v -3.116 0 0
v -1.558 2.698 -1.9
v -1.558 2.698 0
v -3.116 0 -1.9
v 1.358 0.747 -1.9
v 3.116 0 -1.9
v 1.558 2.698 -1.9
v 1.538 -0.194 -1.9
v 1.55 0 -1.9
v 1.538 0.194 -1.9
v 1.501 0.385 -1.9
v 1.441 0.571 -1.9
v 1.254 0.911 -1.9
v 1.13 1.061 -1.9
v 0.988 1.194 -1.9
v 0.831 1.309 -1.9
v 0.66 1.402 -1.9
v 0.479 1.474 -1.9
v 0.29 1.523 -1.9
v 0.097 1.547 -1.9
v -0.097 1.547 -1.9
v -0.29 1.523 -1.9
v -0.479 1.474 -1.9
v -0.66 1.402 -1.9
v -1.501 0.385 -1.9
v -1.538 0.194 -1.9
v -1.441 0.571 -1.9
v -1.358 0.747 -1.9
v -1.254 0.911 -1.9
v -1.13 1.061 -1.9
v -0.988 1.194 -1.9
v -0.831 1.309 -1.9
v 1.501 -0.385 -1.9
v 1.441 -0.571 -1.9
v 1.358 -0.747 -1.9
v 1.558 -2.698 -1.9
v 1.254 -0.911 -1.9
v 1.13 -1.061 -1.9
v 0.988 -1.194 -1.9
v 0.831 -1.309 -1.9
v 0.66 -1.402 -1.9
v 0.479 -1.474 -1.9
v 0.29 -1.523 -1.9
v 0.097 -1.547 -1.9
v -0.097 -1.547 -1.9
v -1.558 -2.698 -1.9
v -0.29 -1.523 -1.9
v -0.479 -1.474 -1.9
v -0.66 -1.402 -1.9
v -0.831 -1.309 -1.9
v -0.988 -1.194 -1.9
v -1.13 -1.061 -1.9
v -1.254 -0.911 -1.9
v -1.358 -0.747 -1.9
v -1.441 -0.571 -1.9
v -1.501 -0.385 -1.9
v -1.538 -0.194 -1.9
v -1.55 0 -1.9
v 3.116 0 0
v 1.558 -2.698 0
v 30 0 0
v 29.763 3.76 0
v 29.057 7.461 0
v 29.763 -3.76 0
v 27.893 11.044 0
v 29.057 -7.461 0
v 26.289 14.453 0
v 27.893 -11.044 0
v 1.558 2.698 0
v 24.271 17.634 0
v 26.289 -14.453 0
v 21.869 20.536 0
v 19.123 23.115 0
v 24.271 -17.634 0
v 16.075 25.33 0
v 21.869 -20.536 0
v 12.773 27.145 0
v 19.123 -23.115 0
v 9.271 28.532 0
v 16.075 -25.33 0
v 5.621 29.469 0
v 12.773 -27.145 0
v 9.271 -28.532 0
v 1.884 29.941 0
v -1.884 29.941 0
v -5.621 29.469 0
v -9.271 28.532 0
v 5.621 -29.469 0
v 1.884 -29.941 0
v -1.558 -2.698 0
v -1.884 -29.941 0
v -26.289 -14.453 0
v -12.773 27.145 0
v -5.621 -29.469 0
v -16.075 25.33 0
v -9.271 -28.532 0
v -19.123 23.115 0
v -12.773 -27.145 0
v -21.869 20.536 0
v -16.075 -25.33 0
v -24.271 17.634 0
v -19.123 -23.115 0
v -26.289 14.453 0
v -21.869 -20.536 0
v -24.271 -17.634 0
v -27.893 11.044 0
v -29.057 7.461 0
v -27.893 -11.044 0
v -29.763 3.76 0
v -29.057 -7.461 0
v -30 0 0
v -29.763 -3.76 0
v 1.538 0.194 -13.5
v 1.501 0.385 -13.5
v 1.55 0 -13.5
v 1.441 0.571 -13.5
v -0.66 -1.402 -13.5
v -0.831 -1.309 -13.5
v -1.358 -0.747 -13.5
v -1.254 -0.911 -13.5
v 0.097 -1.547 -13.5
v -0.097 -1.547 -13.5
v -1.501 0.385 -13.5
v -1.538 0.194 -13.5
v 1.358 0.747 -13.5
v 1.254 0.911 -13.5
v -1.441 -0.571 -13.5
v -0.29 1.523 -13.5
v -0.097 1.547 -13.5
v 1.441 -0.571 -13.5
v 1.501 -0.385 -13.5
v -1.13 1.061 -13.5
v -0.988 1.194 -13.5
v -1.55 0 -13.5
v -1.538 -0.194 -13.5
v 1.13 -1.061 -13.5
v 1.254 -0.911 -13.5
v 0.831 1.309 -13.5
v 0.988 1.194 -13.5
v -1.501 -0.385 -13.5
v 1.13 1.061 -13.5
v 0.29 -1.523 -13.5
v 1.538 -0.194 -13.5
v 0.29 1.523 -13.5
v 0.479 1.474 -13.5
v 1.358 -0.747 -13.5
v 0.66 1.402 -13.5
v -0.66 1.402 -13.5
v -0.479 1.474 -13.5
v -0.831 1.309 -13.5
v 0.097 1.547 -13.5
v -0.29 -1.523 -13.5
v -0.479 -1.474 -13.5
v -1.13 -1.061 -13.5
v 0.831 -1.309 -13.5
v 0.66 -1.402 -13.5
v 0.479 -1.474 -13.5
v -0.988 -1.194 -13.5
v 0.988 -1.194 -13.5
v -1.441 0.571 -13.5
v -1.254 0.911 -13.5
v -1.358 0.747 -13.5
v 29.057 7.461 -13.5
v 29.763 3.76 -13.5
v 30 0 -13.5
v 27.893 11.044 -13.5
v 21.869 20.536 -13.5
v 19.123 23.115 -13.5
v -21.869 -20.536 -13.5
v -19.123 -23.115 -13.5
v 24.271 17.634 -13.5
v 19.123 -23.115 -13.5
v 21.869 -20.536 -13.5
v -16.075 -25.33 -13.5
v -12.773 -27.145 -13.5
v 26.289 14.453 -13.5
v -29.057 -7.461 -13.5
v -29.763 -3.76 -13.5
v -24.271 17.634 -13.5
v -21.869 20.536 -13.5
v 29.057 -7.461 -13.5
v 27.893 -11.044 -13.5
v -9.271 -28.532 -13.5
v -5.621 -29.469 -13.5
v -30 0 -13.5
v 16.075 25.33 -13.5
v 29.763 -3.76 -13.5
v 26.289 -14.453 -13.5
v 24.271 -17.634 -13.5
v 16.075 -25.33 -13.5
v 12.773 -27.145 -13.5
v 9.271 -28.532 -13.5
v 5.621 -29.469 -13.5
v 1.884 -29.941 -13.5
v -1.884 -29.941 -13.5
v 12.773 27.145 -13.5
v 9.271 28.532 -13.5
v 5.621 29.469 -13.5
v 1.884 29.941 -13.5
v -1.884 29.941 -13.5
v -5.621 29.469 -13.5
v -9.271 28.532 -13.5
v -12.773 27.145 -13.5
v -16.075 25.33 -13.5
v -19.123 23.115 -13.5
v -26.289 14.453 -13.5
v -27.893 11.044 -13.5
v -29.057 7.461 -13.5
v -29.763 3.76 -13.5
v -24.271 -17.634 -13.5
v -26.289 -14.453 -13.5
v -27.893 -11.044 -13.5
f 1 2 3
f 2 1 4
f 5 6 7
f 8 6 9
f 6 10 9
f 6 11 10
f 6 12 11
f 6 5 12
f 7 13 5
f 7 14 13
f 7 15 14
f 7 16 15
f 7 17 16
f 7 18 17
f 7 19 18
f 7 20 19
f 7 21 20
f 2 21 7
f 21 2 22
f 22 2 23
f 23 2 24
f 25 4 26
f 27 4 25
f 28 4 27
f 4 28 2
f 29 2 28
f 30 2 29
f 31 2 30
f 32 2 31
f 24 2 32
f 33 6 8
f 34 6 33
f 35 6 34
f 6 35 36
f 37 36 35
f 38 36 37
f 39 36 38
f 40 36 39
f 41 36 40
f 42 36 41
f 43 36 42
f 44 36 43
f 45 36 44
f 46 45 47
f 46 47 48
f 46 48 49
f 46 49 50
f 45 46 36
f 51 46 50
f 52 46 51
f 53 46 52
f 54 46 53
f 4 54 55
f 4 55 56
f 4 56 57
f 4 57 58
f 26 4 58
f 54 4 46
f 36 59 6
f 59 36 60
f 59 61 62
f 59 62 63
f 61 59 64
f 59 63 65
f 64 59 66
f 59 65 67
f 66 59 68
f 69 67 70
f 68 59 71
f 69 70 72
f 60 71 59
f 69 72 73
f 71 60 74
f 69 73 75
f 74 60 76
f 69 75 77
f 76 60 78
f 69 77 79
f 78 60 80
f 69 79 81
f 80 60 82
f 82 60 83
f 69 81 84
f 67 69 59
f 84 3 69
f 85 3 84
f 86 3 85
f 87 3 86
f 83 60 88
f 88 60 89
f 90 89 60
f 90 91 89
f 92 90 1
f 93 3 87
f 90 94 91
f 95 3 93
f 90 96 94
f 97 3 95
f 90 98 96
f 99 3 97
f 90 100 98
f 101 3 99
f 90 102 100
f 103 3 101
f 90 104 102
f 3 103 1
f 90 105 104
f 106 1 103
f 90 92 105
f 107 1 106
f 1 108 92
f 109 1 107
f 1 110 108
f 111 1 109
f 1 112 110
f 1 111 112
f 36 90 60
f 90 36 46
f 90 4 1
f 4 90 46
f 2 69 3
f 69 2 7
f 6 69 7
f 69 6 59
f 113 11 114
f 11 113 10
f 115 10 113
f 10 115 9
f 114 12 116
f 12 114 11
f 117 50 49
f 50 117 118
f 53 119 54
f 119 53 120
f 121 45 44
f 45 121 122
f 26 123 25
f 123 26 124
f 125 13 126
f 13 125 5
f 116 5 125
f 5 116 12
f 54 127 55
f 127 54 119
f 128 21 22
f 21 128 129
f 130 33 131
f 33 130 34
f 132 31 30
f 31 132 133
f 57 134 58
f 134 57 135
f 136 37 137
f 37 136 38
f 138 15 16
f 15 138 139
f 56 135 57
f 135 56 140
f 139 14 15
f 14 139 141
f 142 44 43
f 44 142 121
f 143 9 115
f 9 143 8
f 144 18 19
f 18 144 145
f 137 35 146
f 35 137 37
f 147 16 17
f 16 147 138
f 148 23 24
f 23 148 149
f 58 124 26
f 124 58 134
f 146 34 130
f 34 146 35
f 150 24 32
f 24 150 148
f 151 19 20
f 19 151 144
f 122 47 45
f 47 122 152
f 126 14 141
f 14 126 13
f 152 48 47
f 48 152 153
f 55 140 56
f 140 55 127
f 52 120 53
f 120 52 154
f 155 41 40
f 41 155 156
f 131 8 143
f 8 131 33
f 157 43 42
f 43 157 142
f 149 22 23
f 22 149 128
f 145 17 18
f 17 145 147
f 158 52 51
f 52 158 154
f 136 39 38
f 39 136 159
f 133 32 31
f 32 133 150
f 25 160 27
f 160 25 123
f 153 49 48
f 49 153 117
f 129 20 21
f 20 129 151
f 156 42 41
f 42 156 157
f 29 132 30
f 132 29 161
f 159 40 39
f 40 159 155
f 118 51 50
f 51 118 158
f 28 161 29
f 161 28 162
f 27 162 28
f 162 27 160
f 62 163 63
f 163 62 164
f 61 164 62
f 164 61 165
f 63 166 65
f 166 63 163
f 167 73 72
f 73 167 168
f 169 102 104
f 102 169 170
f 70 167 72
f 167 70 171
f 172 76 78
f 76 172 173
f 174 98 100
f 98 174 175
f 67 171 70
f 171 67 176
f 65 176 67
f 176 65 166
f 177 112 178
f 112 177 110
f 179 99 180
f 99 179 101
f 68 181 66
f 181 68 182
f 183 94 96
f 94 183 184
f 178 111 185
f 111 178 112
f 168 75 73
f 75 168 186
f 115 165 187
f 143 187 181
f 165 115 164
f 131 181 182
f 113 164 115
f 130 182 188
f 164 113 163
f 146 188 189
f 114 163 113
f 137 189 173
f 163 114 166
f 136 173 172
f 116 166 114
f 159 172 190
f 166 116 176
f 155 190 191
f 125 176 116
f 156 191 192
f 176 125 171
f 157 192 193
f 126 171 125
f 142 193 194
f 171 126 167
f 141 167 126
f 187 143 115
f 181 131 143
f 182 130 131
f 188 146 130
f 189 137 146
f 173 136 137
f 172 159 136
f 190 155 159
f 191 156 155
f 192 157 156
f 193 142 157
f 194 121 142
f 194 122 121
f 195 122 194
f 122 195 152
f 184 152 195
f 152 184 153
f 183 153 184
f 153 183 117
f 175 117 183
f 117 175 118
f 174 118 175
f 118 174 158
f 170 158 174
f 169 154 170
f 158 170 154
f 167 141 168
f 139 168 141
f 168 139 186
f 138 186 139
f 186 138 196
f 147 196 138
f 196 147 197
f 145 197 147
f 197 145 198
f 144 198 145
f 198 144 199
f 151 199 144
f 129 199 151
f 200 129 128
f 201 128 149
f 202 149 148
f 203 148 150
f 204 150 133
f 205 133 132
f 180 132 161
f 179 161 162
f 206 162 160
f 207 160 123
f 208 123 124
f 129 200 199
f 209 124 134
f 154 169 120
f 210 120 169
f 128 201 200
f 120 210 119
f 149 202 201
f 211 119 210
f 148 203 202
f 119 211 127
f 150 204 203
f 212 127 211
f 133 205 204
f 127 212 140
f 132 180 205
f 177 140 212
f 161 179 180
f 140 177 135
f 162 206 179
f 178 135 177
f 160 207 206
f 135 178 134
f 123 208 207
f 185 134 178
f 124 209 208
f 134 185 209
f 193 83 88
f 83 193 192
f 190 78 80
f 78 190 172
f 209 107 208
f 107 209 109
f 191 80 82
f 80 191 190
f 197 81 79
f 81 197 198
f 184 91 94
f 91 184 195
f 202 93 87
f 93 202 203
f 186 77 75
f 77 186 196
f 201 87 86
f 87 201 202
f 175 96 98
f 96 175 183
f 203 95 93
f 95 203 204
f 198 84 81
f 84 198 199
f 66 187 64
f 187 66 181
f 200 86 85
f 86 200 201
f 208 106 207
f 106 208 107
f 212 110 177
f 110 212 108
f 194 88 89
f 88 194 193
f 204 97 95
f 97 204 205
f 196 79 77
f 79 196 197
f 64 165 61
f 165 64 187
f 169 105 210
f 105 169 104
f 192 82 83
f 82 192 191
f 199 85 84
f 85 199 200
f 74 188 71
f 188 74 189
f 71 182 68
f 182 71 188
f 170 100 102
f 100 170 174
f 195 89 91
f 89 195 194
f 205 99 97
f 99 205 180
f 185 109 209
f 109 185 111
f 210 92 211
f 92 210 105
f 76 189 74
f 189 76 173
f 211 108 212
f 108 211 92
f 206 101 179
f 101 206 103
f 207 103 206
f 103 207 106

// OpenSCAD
$fn = 50;

difference() {
	union() {
		translate(v = [0, 0, -13.5]) {
			cylinder(h = 13.5, r = 30.0);
		}
	}
	union() {
		translate(v = [0, 0, 0]) {
			rotate(a = [0, 0, 0]) {
				difference() {
					union() {
						translate(v = [0, 0, -1.9]) {
							linear_extrude(height = 1.9) {
								polygon(points = [[3.1158, 0.0], [1.5579000000000005, 2.698361953111554], [-1.5578999999999994, 2.6983619531115544], [-3.1158, 3.815754496783323e-16], [-1.5579000000000014, -2.6983619531115535], [1.557899999999998, -2.6983619531115552]]);
							}
						}
					}
					union();
				}
			}
		}
		#translate(v = [0, 0, -100.0]) {
			cylinder(h = 200, r = 1.55);
		}
	}
}
